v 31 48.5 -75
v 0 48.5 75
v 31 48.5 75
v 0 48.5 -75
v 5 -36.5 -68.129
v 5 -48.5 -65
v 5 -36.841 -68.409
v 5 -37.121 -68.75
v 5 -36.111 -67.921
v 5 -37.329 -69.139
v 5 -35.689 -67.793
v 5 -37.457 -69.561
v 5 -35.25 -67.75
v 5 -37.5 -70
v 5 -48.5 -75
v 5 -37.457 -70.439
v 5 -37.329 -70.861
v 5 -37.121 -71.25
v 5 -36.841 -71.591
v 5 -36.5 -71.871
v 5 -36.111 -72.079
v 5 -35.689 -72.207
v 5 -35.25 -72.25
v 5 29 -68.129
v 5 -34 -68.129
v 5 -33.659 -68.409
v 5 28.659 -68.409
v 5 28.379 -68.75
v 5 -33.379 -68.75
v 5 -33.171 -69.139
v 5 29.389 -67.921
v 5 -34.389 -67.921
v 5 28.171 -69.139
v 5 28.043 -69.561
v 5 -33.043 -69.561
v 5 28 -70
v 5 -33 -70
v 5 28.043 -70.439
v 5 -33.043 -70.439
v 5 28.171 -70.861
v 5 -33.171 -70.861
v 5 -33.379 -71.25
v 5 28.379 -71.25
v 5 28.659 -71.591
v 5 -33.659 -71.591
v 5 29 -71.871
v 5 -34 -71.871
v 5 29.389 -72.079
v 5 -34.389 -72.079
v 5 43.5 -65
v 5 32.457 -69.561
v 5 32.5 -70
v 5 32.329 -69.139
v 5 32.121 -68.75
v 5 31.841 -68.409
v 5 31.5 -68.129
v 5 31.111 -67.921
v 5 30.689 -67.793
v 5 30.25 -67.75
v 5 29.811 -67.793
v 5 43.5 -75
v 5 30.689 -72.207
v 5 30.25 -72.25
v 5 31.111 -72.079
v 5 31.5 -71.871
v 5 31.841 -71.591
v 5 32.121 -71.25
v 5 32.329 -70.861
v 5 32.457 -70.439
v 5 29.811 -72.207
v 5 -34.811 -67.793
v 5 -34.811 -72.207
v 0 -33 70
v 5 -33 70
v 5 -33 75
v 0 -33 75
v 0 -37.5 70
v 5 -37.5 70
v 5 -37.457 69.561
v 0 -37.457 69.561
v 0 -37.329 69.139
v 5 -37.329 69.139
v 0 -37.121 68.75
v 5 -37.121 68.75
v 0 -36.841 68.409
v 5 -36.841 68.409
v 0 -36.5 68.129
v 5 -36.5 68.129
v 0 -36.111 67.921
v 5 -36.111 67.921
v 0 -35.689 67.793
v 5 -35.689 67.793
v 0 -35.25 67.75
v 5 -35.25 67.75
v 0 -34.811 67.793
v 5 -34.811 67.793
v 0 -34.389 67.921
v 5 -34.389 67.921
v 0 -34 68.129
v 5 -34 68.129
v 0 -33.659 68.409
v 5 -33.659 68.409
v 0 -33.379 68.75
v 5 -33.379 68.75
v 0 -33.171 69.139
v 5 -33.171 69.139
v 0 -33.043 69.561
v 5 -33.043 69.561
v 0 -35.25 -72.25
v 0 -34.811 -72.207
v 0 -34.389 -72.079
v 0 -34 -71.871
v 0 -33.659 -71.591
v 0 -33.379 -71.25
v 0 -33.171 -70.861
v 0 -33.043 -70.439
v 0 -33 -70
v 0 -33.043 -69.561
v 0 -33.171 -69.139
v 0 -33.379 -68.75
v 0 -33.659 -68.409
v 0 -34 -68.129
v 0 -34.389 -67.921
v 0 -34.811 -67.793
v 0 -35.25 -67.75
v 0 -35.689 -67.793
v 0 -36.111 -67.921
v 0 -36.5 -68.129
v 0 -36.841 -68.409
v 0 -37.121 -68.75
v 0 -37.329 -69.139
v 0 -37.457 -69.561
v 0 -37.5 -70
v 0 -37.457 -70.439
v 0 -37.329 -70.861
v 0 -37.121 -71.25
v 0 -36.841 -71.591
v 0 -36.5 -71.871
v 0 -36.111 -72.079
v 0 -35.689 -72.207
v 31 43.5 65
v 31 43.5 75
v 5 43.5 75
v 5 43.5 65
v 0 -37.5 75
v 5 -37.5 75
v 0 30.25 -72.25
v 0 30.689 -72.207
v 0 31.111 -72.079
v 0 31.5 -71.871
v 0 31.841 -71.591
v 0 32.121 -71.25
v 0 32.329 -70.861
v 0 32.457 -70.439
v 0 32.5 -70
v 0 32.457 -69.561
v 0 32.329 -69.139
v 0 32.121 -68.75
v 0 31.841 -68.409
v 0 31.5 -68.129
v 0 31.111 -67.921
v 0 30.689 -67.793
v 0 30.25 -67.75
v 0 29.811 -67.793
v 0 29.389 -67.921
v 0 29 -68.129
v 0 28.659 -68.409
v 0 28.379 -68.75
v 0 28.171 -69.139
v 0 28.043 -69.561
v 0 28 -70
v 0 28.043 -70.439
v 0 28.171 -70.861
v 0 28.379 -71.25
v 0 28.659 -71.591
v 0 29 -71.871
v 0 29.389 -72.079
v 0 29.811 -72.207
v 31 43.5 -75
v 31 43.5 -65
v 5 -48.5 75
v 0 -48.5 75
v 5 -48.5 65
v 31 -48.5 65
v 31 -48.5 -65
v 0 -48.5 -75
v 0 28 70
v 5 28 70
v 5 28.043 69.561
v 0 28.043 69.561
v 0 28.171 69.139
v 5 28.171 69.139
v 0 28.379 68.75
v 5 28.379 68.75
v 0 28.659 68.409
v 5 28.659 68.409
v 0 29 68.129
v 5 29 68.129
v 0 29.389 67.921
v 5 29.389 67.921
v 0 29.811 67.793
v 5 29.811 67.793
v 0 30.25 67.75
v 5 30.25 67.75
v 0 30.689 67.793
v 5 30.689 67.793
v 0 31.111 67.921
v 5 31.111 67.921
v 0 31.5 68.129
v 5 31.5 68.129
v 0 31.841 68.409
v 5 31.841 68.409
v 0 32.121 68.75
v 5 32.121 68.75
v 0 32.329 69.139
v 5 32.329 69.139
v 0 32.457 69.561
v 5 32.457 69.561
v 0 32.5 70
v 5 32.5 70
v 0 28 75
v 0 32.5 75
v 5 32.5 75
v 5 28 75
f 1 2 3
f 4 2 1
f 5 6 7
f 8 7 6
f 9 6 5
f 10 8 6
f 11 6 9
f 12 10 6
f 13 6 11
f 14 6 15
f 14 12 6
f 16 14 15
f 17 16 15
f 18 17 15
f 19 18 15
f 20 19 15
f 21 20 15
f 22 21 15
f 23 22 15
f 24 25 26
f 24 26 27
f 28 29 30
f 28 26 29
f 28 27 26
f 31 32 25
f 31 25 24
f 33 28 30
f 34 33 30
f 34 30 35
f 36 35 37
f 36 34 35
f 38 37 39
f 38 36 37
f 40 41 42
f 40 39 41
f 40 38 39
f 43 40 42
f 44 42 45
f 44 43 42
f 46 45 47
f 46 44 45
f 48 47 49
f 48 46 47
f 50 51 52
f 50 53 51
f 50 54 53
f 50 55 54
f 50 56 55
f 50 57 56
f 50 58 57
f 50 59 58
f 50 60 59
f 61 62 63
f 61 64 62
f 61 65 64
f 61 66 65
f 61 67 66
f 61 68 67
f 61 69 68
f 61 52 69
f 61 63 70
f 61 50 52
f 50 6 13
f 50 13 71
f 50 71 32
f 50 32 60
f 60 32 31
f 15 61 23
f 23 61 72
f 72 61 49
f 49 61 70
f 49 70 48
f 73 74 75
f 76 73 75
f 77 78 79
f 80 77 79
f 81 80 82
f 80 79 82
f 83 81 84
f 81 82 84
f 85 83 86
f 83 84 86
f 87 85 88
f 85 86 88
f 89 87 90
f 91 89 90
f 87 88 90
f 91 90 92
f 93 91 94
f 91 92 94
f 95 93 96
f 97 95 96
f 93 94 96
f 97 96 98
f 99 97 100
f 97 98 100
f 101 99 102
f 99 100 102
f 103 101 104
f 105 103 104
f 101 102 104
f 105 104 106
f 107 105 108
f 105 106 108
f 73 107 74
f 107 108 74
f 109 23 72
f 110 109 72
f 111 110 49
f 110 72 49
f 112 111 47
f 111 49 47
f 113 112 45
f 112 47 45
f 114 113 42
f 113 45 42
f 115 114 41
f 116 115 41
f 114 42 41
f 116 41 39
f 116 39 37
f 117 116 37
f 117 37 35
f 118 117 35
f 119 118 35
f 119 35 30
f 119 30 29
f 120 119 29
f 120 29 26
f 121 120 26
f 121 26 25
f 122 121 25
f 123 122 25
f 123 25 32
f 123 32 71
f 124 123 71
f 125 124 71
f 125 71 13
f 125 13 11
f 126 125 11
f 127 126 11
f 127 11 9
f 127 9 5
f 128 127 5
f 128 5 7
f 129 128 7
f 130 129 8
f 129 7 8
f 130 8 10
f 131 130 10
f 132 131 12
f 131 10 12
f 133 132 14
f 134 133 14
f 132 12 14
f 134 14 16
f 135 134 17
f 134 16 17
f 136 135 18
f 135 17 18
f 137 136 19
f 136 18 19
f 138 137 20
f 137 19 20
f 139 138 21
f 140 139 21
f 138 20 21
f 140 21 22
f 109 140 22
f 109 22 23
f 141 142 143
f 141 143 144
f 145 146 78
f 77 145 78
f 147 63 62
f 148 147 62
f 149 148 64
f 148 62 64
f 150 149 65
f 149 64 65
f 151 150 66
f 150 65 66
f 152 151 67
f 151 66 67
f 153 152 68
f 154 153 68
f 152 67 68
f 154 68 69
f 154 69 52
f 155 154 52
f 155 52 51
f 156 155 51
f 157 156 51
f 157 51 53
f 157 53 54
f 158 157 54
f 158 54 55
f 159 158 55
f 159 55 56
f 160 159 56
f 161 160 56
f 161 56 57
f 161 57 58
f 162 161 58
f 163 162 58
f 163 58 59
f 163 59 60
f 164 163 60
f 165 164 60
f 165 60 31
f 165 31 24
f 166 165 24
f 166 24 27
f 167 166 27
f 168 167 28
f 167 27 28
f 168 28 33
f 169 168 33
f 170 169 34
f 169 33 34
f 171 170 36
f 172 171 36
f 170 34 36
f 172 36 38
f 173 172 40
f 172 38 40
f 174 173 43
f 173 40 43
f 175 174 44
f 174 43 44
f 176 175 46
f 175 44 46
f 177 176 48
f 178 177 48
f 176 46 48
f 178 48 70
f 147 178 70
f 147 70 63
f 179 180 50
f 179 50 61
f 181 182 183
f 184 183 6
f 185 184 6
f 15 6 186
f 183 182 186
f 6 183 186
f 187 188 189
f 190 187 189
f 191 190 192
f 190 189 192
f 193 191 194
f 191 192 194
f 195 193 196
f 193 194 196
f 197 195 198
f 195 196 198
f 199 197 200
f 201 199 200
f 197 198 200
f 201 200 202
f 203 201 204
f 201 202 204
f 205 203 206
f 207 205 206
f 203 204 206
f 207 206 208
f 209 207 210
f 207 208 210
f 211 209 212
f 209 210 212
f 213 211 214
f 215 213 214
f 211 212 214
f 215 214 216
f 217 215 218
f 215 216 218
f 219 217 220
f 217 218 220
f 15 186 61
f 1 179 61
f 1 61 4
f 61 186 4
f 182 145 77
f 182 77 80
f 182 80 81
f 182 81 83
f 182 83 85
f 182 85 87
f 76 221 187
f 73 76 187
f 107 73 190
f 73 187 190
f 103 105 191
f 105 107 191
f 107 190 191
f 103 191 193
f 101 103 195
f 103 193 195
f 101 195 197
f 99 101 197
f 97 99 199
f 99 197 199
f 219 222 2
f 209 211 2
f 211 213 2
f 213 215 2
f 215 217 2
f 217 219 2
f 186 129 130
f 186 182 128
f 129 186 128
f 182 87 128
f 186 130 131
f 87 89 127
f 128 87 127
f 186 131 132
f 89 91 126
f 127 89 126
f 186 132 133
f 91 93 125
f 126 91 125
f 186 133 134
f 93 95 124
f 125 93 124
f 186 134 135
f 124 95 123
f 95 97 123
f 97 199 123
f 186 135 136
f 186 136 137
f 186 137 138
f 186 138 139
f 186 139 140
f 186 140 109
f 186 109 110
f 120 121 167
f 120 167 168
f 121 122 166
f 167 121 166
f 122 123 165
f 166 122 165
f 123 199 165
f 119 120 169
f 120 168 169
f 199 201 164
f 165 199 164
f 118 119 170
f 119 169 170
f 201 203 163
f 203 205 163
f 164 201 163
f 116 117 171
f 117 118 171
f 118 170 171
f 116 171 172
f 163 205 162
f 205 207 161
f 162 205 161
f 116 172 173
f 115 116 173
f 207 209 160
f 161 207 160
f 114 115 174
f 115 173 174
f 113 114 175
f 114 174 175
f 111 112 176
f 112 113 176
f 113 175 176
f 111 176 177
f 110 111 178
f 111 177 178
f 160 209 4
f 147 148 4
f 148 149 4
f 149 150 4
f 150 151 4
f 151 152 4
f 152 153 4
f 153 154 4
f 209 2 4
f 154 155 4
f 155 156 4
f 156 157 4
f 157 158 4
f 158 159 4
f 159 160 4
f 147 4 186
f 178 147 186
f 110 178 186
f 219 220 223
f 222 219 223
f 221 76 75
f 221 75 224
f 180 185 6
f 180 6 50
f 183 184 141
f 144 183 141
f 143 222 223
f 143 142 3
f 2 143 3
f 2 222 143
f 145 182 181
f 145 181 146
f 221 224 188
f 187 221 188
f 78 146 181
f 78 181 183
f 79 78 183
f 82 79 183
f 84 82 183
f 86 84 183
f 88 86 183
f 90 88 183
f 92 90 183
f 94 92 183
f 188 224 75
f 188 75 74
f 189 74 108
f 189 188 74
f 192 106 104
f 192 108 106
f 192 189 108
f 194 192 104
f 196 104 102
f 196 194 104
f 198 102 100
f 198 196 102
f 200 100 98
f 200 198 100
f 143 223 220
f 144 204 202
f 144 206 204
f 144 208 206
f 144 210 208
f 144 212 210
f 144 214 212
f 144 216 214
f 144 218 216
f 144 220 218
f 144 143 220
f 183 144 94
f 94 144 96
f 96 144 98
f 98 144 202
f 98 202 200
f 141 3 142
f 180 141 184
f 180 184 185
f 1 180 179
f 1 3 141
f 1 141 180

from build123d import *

# Parameters (mm, degrees)
SKETCH_1_W          = 150
SKETCH_1_H          = 97
EXTRUDE_1_DEPTH     = 31
SKETCH_2_W          = 10
SKETCH_2_H          = 92
CUT_EXTRUDE_1_DEPTH = 26
SKETCH_3_R          = 2.25
CUT_EXTRUDE_2_DEPTH = 26


with BuildPart() as part:
    # 草图1 → 凸台-拉伸1 (new body)
    with BuildSketch(Plane(origin=(0, 0, 0), x_dir=(0, 0, -1), z_dir=(1, 0, 0))):
        Rectangle(SKETCH_1_W, SKETCH_1_H)
    extrude(amount=EXTRUDE_1_DEPTH)

    # 草图2 → 切除-拉伸1 (cut)
    with BuildSketch(Plane(origin=(31, 0, 0), x_dir=(0, 0, -1), z_dir=(1, 0, 0))):
        with Locations((-70, -2.5)):
            Rectangle(SKETCH_2_W, SKETCH_2_H)
        with Locations((70, -2.5)):
            Rectangle(SKETCH_2_W, SKETCH_2_H)
    extrude(amount=-CUT_EXTRUDE_1_DEPTH, mode=Mode.SUBTRACT)

    # 草图3 → 切除-拉伸2 (cut)
    with BuildSketch(Plane(origin=(5, 0, 0), x_dir=(0, 0, -1), z_dir=(1, 0, 0))):
        with Locations((70, 30.25)):
            Circle(SKETCH_3_R)
        with Locations((70, -35.25)):
            Circle(SKETCH_3_R)
        with BuildLine():
            Line((-70, 32.5), (-75, 32.5))
            Line((-75, 32.5), (-75, 28))
            Line((-75, 28), (-70, 28))
            ThreePointArc((-70, 28), (-67.75, 30.25), (-70, 32.5))
        make_face()
        with BuildLine():
            Line((-70, -33), (-75, -33))
            Line((-75, -33), (-75, -37.5))
            Line((-75, -37.5), (-70, -37.5))
            ThreePointArc((-70, -37.5), (-67.75, -35.25), (-70, -33))
        make_face()
    extrude(amount=-CUT_EXTRUDE_2_DEPTH, mode=Mode.SUBTRACT)


solid = part.part
